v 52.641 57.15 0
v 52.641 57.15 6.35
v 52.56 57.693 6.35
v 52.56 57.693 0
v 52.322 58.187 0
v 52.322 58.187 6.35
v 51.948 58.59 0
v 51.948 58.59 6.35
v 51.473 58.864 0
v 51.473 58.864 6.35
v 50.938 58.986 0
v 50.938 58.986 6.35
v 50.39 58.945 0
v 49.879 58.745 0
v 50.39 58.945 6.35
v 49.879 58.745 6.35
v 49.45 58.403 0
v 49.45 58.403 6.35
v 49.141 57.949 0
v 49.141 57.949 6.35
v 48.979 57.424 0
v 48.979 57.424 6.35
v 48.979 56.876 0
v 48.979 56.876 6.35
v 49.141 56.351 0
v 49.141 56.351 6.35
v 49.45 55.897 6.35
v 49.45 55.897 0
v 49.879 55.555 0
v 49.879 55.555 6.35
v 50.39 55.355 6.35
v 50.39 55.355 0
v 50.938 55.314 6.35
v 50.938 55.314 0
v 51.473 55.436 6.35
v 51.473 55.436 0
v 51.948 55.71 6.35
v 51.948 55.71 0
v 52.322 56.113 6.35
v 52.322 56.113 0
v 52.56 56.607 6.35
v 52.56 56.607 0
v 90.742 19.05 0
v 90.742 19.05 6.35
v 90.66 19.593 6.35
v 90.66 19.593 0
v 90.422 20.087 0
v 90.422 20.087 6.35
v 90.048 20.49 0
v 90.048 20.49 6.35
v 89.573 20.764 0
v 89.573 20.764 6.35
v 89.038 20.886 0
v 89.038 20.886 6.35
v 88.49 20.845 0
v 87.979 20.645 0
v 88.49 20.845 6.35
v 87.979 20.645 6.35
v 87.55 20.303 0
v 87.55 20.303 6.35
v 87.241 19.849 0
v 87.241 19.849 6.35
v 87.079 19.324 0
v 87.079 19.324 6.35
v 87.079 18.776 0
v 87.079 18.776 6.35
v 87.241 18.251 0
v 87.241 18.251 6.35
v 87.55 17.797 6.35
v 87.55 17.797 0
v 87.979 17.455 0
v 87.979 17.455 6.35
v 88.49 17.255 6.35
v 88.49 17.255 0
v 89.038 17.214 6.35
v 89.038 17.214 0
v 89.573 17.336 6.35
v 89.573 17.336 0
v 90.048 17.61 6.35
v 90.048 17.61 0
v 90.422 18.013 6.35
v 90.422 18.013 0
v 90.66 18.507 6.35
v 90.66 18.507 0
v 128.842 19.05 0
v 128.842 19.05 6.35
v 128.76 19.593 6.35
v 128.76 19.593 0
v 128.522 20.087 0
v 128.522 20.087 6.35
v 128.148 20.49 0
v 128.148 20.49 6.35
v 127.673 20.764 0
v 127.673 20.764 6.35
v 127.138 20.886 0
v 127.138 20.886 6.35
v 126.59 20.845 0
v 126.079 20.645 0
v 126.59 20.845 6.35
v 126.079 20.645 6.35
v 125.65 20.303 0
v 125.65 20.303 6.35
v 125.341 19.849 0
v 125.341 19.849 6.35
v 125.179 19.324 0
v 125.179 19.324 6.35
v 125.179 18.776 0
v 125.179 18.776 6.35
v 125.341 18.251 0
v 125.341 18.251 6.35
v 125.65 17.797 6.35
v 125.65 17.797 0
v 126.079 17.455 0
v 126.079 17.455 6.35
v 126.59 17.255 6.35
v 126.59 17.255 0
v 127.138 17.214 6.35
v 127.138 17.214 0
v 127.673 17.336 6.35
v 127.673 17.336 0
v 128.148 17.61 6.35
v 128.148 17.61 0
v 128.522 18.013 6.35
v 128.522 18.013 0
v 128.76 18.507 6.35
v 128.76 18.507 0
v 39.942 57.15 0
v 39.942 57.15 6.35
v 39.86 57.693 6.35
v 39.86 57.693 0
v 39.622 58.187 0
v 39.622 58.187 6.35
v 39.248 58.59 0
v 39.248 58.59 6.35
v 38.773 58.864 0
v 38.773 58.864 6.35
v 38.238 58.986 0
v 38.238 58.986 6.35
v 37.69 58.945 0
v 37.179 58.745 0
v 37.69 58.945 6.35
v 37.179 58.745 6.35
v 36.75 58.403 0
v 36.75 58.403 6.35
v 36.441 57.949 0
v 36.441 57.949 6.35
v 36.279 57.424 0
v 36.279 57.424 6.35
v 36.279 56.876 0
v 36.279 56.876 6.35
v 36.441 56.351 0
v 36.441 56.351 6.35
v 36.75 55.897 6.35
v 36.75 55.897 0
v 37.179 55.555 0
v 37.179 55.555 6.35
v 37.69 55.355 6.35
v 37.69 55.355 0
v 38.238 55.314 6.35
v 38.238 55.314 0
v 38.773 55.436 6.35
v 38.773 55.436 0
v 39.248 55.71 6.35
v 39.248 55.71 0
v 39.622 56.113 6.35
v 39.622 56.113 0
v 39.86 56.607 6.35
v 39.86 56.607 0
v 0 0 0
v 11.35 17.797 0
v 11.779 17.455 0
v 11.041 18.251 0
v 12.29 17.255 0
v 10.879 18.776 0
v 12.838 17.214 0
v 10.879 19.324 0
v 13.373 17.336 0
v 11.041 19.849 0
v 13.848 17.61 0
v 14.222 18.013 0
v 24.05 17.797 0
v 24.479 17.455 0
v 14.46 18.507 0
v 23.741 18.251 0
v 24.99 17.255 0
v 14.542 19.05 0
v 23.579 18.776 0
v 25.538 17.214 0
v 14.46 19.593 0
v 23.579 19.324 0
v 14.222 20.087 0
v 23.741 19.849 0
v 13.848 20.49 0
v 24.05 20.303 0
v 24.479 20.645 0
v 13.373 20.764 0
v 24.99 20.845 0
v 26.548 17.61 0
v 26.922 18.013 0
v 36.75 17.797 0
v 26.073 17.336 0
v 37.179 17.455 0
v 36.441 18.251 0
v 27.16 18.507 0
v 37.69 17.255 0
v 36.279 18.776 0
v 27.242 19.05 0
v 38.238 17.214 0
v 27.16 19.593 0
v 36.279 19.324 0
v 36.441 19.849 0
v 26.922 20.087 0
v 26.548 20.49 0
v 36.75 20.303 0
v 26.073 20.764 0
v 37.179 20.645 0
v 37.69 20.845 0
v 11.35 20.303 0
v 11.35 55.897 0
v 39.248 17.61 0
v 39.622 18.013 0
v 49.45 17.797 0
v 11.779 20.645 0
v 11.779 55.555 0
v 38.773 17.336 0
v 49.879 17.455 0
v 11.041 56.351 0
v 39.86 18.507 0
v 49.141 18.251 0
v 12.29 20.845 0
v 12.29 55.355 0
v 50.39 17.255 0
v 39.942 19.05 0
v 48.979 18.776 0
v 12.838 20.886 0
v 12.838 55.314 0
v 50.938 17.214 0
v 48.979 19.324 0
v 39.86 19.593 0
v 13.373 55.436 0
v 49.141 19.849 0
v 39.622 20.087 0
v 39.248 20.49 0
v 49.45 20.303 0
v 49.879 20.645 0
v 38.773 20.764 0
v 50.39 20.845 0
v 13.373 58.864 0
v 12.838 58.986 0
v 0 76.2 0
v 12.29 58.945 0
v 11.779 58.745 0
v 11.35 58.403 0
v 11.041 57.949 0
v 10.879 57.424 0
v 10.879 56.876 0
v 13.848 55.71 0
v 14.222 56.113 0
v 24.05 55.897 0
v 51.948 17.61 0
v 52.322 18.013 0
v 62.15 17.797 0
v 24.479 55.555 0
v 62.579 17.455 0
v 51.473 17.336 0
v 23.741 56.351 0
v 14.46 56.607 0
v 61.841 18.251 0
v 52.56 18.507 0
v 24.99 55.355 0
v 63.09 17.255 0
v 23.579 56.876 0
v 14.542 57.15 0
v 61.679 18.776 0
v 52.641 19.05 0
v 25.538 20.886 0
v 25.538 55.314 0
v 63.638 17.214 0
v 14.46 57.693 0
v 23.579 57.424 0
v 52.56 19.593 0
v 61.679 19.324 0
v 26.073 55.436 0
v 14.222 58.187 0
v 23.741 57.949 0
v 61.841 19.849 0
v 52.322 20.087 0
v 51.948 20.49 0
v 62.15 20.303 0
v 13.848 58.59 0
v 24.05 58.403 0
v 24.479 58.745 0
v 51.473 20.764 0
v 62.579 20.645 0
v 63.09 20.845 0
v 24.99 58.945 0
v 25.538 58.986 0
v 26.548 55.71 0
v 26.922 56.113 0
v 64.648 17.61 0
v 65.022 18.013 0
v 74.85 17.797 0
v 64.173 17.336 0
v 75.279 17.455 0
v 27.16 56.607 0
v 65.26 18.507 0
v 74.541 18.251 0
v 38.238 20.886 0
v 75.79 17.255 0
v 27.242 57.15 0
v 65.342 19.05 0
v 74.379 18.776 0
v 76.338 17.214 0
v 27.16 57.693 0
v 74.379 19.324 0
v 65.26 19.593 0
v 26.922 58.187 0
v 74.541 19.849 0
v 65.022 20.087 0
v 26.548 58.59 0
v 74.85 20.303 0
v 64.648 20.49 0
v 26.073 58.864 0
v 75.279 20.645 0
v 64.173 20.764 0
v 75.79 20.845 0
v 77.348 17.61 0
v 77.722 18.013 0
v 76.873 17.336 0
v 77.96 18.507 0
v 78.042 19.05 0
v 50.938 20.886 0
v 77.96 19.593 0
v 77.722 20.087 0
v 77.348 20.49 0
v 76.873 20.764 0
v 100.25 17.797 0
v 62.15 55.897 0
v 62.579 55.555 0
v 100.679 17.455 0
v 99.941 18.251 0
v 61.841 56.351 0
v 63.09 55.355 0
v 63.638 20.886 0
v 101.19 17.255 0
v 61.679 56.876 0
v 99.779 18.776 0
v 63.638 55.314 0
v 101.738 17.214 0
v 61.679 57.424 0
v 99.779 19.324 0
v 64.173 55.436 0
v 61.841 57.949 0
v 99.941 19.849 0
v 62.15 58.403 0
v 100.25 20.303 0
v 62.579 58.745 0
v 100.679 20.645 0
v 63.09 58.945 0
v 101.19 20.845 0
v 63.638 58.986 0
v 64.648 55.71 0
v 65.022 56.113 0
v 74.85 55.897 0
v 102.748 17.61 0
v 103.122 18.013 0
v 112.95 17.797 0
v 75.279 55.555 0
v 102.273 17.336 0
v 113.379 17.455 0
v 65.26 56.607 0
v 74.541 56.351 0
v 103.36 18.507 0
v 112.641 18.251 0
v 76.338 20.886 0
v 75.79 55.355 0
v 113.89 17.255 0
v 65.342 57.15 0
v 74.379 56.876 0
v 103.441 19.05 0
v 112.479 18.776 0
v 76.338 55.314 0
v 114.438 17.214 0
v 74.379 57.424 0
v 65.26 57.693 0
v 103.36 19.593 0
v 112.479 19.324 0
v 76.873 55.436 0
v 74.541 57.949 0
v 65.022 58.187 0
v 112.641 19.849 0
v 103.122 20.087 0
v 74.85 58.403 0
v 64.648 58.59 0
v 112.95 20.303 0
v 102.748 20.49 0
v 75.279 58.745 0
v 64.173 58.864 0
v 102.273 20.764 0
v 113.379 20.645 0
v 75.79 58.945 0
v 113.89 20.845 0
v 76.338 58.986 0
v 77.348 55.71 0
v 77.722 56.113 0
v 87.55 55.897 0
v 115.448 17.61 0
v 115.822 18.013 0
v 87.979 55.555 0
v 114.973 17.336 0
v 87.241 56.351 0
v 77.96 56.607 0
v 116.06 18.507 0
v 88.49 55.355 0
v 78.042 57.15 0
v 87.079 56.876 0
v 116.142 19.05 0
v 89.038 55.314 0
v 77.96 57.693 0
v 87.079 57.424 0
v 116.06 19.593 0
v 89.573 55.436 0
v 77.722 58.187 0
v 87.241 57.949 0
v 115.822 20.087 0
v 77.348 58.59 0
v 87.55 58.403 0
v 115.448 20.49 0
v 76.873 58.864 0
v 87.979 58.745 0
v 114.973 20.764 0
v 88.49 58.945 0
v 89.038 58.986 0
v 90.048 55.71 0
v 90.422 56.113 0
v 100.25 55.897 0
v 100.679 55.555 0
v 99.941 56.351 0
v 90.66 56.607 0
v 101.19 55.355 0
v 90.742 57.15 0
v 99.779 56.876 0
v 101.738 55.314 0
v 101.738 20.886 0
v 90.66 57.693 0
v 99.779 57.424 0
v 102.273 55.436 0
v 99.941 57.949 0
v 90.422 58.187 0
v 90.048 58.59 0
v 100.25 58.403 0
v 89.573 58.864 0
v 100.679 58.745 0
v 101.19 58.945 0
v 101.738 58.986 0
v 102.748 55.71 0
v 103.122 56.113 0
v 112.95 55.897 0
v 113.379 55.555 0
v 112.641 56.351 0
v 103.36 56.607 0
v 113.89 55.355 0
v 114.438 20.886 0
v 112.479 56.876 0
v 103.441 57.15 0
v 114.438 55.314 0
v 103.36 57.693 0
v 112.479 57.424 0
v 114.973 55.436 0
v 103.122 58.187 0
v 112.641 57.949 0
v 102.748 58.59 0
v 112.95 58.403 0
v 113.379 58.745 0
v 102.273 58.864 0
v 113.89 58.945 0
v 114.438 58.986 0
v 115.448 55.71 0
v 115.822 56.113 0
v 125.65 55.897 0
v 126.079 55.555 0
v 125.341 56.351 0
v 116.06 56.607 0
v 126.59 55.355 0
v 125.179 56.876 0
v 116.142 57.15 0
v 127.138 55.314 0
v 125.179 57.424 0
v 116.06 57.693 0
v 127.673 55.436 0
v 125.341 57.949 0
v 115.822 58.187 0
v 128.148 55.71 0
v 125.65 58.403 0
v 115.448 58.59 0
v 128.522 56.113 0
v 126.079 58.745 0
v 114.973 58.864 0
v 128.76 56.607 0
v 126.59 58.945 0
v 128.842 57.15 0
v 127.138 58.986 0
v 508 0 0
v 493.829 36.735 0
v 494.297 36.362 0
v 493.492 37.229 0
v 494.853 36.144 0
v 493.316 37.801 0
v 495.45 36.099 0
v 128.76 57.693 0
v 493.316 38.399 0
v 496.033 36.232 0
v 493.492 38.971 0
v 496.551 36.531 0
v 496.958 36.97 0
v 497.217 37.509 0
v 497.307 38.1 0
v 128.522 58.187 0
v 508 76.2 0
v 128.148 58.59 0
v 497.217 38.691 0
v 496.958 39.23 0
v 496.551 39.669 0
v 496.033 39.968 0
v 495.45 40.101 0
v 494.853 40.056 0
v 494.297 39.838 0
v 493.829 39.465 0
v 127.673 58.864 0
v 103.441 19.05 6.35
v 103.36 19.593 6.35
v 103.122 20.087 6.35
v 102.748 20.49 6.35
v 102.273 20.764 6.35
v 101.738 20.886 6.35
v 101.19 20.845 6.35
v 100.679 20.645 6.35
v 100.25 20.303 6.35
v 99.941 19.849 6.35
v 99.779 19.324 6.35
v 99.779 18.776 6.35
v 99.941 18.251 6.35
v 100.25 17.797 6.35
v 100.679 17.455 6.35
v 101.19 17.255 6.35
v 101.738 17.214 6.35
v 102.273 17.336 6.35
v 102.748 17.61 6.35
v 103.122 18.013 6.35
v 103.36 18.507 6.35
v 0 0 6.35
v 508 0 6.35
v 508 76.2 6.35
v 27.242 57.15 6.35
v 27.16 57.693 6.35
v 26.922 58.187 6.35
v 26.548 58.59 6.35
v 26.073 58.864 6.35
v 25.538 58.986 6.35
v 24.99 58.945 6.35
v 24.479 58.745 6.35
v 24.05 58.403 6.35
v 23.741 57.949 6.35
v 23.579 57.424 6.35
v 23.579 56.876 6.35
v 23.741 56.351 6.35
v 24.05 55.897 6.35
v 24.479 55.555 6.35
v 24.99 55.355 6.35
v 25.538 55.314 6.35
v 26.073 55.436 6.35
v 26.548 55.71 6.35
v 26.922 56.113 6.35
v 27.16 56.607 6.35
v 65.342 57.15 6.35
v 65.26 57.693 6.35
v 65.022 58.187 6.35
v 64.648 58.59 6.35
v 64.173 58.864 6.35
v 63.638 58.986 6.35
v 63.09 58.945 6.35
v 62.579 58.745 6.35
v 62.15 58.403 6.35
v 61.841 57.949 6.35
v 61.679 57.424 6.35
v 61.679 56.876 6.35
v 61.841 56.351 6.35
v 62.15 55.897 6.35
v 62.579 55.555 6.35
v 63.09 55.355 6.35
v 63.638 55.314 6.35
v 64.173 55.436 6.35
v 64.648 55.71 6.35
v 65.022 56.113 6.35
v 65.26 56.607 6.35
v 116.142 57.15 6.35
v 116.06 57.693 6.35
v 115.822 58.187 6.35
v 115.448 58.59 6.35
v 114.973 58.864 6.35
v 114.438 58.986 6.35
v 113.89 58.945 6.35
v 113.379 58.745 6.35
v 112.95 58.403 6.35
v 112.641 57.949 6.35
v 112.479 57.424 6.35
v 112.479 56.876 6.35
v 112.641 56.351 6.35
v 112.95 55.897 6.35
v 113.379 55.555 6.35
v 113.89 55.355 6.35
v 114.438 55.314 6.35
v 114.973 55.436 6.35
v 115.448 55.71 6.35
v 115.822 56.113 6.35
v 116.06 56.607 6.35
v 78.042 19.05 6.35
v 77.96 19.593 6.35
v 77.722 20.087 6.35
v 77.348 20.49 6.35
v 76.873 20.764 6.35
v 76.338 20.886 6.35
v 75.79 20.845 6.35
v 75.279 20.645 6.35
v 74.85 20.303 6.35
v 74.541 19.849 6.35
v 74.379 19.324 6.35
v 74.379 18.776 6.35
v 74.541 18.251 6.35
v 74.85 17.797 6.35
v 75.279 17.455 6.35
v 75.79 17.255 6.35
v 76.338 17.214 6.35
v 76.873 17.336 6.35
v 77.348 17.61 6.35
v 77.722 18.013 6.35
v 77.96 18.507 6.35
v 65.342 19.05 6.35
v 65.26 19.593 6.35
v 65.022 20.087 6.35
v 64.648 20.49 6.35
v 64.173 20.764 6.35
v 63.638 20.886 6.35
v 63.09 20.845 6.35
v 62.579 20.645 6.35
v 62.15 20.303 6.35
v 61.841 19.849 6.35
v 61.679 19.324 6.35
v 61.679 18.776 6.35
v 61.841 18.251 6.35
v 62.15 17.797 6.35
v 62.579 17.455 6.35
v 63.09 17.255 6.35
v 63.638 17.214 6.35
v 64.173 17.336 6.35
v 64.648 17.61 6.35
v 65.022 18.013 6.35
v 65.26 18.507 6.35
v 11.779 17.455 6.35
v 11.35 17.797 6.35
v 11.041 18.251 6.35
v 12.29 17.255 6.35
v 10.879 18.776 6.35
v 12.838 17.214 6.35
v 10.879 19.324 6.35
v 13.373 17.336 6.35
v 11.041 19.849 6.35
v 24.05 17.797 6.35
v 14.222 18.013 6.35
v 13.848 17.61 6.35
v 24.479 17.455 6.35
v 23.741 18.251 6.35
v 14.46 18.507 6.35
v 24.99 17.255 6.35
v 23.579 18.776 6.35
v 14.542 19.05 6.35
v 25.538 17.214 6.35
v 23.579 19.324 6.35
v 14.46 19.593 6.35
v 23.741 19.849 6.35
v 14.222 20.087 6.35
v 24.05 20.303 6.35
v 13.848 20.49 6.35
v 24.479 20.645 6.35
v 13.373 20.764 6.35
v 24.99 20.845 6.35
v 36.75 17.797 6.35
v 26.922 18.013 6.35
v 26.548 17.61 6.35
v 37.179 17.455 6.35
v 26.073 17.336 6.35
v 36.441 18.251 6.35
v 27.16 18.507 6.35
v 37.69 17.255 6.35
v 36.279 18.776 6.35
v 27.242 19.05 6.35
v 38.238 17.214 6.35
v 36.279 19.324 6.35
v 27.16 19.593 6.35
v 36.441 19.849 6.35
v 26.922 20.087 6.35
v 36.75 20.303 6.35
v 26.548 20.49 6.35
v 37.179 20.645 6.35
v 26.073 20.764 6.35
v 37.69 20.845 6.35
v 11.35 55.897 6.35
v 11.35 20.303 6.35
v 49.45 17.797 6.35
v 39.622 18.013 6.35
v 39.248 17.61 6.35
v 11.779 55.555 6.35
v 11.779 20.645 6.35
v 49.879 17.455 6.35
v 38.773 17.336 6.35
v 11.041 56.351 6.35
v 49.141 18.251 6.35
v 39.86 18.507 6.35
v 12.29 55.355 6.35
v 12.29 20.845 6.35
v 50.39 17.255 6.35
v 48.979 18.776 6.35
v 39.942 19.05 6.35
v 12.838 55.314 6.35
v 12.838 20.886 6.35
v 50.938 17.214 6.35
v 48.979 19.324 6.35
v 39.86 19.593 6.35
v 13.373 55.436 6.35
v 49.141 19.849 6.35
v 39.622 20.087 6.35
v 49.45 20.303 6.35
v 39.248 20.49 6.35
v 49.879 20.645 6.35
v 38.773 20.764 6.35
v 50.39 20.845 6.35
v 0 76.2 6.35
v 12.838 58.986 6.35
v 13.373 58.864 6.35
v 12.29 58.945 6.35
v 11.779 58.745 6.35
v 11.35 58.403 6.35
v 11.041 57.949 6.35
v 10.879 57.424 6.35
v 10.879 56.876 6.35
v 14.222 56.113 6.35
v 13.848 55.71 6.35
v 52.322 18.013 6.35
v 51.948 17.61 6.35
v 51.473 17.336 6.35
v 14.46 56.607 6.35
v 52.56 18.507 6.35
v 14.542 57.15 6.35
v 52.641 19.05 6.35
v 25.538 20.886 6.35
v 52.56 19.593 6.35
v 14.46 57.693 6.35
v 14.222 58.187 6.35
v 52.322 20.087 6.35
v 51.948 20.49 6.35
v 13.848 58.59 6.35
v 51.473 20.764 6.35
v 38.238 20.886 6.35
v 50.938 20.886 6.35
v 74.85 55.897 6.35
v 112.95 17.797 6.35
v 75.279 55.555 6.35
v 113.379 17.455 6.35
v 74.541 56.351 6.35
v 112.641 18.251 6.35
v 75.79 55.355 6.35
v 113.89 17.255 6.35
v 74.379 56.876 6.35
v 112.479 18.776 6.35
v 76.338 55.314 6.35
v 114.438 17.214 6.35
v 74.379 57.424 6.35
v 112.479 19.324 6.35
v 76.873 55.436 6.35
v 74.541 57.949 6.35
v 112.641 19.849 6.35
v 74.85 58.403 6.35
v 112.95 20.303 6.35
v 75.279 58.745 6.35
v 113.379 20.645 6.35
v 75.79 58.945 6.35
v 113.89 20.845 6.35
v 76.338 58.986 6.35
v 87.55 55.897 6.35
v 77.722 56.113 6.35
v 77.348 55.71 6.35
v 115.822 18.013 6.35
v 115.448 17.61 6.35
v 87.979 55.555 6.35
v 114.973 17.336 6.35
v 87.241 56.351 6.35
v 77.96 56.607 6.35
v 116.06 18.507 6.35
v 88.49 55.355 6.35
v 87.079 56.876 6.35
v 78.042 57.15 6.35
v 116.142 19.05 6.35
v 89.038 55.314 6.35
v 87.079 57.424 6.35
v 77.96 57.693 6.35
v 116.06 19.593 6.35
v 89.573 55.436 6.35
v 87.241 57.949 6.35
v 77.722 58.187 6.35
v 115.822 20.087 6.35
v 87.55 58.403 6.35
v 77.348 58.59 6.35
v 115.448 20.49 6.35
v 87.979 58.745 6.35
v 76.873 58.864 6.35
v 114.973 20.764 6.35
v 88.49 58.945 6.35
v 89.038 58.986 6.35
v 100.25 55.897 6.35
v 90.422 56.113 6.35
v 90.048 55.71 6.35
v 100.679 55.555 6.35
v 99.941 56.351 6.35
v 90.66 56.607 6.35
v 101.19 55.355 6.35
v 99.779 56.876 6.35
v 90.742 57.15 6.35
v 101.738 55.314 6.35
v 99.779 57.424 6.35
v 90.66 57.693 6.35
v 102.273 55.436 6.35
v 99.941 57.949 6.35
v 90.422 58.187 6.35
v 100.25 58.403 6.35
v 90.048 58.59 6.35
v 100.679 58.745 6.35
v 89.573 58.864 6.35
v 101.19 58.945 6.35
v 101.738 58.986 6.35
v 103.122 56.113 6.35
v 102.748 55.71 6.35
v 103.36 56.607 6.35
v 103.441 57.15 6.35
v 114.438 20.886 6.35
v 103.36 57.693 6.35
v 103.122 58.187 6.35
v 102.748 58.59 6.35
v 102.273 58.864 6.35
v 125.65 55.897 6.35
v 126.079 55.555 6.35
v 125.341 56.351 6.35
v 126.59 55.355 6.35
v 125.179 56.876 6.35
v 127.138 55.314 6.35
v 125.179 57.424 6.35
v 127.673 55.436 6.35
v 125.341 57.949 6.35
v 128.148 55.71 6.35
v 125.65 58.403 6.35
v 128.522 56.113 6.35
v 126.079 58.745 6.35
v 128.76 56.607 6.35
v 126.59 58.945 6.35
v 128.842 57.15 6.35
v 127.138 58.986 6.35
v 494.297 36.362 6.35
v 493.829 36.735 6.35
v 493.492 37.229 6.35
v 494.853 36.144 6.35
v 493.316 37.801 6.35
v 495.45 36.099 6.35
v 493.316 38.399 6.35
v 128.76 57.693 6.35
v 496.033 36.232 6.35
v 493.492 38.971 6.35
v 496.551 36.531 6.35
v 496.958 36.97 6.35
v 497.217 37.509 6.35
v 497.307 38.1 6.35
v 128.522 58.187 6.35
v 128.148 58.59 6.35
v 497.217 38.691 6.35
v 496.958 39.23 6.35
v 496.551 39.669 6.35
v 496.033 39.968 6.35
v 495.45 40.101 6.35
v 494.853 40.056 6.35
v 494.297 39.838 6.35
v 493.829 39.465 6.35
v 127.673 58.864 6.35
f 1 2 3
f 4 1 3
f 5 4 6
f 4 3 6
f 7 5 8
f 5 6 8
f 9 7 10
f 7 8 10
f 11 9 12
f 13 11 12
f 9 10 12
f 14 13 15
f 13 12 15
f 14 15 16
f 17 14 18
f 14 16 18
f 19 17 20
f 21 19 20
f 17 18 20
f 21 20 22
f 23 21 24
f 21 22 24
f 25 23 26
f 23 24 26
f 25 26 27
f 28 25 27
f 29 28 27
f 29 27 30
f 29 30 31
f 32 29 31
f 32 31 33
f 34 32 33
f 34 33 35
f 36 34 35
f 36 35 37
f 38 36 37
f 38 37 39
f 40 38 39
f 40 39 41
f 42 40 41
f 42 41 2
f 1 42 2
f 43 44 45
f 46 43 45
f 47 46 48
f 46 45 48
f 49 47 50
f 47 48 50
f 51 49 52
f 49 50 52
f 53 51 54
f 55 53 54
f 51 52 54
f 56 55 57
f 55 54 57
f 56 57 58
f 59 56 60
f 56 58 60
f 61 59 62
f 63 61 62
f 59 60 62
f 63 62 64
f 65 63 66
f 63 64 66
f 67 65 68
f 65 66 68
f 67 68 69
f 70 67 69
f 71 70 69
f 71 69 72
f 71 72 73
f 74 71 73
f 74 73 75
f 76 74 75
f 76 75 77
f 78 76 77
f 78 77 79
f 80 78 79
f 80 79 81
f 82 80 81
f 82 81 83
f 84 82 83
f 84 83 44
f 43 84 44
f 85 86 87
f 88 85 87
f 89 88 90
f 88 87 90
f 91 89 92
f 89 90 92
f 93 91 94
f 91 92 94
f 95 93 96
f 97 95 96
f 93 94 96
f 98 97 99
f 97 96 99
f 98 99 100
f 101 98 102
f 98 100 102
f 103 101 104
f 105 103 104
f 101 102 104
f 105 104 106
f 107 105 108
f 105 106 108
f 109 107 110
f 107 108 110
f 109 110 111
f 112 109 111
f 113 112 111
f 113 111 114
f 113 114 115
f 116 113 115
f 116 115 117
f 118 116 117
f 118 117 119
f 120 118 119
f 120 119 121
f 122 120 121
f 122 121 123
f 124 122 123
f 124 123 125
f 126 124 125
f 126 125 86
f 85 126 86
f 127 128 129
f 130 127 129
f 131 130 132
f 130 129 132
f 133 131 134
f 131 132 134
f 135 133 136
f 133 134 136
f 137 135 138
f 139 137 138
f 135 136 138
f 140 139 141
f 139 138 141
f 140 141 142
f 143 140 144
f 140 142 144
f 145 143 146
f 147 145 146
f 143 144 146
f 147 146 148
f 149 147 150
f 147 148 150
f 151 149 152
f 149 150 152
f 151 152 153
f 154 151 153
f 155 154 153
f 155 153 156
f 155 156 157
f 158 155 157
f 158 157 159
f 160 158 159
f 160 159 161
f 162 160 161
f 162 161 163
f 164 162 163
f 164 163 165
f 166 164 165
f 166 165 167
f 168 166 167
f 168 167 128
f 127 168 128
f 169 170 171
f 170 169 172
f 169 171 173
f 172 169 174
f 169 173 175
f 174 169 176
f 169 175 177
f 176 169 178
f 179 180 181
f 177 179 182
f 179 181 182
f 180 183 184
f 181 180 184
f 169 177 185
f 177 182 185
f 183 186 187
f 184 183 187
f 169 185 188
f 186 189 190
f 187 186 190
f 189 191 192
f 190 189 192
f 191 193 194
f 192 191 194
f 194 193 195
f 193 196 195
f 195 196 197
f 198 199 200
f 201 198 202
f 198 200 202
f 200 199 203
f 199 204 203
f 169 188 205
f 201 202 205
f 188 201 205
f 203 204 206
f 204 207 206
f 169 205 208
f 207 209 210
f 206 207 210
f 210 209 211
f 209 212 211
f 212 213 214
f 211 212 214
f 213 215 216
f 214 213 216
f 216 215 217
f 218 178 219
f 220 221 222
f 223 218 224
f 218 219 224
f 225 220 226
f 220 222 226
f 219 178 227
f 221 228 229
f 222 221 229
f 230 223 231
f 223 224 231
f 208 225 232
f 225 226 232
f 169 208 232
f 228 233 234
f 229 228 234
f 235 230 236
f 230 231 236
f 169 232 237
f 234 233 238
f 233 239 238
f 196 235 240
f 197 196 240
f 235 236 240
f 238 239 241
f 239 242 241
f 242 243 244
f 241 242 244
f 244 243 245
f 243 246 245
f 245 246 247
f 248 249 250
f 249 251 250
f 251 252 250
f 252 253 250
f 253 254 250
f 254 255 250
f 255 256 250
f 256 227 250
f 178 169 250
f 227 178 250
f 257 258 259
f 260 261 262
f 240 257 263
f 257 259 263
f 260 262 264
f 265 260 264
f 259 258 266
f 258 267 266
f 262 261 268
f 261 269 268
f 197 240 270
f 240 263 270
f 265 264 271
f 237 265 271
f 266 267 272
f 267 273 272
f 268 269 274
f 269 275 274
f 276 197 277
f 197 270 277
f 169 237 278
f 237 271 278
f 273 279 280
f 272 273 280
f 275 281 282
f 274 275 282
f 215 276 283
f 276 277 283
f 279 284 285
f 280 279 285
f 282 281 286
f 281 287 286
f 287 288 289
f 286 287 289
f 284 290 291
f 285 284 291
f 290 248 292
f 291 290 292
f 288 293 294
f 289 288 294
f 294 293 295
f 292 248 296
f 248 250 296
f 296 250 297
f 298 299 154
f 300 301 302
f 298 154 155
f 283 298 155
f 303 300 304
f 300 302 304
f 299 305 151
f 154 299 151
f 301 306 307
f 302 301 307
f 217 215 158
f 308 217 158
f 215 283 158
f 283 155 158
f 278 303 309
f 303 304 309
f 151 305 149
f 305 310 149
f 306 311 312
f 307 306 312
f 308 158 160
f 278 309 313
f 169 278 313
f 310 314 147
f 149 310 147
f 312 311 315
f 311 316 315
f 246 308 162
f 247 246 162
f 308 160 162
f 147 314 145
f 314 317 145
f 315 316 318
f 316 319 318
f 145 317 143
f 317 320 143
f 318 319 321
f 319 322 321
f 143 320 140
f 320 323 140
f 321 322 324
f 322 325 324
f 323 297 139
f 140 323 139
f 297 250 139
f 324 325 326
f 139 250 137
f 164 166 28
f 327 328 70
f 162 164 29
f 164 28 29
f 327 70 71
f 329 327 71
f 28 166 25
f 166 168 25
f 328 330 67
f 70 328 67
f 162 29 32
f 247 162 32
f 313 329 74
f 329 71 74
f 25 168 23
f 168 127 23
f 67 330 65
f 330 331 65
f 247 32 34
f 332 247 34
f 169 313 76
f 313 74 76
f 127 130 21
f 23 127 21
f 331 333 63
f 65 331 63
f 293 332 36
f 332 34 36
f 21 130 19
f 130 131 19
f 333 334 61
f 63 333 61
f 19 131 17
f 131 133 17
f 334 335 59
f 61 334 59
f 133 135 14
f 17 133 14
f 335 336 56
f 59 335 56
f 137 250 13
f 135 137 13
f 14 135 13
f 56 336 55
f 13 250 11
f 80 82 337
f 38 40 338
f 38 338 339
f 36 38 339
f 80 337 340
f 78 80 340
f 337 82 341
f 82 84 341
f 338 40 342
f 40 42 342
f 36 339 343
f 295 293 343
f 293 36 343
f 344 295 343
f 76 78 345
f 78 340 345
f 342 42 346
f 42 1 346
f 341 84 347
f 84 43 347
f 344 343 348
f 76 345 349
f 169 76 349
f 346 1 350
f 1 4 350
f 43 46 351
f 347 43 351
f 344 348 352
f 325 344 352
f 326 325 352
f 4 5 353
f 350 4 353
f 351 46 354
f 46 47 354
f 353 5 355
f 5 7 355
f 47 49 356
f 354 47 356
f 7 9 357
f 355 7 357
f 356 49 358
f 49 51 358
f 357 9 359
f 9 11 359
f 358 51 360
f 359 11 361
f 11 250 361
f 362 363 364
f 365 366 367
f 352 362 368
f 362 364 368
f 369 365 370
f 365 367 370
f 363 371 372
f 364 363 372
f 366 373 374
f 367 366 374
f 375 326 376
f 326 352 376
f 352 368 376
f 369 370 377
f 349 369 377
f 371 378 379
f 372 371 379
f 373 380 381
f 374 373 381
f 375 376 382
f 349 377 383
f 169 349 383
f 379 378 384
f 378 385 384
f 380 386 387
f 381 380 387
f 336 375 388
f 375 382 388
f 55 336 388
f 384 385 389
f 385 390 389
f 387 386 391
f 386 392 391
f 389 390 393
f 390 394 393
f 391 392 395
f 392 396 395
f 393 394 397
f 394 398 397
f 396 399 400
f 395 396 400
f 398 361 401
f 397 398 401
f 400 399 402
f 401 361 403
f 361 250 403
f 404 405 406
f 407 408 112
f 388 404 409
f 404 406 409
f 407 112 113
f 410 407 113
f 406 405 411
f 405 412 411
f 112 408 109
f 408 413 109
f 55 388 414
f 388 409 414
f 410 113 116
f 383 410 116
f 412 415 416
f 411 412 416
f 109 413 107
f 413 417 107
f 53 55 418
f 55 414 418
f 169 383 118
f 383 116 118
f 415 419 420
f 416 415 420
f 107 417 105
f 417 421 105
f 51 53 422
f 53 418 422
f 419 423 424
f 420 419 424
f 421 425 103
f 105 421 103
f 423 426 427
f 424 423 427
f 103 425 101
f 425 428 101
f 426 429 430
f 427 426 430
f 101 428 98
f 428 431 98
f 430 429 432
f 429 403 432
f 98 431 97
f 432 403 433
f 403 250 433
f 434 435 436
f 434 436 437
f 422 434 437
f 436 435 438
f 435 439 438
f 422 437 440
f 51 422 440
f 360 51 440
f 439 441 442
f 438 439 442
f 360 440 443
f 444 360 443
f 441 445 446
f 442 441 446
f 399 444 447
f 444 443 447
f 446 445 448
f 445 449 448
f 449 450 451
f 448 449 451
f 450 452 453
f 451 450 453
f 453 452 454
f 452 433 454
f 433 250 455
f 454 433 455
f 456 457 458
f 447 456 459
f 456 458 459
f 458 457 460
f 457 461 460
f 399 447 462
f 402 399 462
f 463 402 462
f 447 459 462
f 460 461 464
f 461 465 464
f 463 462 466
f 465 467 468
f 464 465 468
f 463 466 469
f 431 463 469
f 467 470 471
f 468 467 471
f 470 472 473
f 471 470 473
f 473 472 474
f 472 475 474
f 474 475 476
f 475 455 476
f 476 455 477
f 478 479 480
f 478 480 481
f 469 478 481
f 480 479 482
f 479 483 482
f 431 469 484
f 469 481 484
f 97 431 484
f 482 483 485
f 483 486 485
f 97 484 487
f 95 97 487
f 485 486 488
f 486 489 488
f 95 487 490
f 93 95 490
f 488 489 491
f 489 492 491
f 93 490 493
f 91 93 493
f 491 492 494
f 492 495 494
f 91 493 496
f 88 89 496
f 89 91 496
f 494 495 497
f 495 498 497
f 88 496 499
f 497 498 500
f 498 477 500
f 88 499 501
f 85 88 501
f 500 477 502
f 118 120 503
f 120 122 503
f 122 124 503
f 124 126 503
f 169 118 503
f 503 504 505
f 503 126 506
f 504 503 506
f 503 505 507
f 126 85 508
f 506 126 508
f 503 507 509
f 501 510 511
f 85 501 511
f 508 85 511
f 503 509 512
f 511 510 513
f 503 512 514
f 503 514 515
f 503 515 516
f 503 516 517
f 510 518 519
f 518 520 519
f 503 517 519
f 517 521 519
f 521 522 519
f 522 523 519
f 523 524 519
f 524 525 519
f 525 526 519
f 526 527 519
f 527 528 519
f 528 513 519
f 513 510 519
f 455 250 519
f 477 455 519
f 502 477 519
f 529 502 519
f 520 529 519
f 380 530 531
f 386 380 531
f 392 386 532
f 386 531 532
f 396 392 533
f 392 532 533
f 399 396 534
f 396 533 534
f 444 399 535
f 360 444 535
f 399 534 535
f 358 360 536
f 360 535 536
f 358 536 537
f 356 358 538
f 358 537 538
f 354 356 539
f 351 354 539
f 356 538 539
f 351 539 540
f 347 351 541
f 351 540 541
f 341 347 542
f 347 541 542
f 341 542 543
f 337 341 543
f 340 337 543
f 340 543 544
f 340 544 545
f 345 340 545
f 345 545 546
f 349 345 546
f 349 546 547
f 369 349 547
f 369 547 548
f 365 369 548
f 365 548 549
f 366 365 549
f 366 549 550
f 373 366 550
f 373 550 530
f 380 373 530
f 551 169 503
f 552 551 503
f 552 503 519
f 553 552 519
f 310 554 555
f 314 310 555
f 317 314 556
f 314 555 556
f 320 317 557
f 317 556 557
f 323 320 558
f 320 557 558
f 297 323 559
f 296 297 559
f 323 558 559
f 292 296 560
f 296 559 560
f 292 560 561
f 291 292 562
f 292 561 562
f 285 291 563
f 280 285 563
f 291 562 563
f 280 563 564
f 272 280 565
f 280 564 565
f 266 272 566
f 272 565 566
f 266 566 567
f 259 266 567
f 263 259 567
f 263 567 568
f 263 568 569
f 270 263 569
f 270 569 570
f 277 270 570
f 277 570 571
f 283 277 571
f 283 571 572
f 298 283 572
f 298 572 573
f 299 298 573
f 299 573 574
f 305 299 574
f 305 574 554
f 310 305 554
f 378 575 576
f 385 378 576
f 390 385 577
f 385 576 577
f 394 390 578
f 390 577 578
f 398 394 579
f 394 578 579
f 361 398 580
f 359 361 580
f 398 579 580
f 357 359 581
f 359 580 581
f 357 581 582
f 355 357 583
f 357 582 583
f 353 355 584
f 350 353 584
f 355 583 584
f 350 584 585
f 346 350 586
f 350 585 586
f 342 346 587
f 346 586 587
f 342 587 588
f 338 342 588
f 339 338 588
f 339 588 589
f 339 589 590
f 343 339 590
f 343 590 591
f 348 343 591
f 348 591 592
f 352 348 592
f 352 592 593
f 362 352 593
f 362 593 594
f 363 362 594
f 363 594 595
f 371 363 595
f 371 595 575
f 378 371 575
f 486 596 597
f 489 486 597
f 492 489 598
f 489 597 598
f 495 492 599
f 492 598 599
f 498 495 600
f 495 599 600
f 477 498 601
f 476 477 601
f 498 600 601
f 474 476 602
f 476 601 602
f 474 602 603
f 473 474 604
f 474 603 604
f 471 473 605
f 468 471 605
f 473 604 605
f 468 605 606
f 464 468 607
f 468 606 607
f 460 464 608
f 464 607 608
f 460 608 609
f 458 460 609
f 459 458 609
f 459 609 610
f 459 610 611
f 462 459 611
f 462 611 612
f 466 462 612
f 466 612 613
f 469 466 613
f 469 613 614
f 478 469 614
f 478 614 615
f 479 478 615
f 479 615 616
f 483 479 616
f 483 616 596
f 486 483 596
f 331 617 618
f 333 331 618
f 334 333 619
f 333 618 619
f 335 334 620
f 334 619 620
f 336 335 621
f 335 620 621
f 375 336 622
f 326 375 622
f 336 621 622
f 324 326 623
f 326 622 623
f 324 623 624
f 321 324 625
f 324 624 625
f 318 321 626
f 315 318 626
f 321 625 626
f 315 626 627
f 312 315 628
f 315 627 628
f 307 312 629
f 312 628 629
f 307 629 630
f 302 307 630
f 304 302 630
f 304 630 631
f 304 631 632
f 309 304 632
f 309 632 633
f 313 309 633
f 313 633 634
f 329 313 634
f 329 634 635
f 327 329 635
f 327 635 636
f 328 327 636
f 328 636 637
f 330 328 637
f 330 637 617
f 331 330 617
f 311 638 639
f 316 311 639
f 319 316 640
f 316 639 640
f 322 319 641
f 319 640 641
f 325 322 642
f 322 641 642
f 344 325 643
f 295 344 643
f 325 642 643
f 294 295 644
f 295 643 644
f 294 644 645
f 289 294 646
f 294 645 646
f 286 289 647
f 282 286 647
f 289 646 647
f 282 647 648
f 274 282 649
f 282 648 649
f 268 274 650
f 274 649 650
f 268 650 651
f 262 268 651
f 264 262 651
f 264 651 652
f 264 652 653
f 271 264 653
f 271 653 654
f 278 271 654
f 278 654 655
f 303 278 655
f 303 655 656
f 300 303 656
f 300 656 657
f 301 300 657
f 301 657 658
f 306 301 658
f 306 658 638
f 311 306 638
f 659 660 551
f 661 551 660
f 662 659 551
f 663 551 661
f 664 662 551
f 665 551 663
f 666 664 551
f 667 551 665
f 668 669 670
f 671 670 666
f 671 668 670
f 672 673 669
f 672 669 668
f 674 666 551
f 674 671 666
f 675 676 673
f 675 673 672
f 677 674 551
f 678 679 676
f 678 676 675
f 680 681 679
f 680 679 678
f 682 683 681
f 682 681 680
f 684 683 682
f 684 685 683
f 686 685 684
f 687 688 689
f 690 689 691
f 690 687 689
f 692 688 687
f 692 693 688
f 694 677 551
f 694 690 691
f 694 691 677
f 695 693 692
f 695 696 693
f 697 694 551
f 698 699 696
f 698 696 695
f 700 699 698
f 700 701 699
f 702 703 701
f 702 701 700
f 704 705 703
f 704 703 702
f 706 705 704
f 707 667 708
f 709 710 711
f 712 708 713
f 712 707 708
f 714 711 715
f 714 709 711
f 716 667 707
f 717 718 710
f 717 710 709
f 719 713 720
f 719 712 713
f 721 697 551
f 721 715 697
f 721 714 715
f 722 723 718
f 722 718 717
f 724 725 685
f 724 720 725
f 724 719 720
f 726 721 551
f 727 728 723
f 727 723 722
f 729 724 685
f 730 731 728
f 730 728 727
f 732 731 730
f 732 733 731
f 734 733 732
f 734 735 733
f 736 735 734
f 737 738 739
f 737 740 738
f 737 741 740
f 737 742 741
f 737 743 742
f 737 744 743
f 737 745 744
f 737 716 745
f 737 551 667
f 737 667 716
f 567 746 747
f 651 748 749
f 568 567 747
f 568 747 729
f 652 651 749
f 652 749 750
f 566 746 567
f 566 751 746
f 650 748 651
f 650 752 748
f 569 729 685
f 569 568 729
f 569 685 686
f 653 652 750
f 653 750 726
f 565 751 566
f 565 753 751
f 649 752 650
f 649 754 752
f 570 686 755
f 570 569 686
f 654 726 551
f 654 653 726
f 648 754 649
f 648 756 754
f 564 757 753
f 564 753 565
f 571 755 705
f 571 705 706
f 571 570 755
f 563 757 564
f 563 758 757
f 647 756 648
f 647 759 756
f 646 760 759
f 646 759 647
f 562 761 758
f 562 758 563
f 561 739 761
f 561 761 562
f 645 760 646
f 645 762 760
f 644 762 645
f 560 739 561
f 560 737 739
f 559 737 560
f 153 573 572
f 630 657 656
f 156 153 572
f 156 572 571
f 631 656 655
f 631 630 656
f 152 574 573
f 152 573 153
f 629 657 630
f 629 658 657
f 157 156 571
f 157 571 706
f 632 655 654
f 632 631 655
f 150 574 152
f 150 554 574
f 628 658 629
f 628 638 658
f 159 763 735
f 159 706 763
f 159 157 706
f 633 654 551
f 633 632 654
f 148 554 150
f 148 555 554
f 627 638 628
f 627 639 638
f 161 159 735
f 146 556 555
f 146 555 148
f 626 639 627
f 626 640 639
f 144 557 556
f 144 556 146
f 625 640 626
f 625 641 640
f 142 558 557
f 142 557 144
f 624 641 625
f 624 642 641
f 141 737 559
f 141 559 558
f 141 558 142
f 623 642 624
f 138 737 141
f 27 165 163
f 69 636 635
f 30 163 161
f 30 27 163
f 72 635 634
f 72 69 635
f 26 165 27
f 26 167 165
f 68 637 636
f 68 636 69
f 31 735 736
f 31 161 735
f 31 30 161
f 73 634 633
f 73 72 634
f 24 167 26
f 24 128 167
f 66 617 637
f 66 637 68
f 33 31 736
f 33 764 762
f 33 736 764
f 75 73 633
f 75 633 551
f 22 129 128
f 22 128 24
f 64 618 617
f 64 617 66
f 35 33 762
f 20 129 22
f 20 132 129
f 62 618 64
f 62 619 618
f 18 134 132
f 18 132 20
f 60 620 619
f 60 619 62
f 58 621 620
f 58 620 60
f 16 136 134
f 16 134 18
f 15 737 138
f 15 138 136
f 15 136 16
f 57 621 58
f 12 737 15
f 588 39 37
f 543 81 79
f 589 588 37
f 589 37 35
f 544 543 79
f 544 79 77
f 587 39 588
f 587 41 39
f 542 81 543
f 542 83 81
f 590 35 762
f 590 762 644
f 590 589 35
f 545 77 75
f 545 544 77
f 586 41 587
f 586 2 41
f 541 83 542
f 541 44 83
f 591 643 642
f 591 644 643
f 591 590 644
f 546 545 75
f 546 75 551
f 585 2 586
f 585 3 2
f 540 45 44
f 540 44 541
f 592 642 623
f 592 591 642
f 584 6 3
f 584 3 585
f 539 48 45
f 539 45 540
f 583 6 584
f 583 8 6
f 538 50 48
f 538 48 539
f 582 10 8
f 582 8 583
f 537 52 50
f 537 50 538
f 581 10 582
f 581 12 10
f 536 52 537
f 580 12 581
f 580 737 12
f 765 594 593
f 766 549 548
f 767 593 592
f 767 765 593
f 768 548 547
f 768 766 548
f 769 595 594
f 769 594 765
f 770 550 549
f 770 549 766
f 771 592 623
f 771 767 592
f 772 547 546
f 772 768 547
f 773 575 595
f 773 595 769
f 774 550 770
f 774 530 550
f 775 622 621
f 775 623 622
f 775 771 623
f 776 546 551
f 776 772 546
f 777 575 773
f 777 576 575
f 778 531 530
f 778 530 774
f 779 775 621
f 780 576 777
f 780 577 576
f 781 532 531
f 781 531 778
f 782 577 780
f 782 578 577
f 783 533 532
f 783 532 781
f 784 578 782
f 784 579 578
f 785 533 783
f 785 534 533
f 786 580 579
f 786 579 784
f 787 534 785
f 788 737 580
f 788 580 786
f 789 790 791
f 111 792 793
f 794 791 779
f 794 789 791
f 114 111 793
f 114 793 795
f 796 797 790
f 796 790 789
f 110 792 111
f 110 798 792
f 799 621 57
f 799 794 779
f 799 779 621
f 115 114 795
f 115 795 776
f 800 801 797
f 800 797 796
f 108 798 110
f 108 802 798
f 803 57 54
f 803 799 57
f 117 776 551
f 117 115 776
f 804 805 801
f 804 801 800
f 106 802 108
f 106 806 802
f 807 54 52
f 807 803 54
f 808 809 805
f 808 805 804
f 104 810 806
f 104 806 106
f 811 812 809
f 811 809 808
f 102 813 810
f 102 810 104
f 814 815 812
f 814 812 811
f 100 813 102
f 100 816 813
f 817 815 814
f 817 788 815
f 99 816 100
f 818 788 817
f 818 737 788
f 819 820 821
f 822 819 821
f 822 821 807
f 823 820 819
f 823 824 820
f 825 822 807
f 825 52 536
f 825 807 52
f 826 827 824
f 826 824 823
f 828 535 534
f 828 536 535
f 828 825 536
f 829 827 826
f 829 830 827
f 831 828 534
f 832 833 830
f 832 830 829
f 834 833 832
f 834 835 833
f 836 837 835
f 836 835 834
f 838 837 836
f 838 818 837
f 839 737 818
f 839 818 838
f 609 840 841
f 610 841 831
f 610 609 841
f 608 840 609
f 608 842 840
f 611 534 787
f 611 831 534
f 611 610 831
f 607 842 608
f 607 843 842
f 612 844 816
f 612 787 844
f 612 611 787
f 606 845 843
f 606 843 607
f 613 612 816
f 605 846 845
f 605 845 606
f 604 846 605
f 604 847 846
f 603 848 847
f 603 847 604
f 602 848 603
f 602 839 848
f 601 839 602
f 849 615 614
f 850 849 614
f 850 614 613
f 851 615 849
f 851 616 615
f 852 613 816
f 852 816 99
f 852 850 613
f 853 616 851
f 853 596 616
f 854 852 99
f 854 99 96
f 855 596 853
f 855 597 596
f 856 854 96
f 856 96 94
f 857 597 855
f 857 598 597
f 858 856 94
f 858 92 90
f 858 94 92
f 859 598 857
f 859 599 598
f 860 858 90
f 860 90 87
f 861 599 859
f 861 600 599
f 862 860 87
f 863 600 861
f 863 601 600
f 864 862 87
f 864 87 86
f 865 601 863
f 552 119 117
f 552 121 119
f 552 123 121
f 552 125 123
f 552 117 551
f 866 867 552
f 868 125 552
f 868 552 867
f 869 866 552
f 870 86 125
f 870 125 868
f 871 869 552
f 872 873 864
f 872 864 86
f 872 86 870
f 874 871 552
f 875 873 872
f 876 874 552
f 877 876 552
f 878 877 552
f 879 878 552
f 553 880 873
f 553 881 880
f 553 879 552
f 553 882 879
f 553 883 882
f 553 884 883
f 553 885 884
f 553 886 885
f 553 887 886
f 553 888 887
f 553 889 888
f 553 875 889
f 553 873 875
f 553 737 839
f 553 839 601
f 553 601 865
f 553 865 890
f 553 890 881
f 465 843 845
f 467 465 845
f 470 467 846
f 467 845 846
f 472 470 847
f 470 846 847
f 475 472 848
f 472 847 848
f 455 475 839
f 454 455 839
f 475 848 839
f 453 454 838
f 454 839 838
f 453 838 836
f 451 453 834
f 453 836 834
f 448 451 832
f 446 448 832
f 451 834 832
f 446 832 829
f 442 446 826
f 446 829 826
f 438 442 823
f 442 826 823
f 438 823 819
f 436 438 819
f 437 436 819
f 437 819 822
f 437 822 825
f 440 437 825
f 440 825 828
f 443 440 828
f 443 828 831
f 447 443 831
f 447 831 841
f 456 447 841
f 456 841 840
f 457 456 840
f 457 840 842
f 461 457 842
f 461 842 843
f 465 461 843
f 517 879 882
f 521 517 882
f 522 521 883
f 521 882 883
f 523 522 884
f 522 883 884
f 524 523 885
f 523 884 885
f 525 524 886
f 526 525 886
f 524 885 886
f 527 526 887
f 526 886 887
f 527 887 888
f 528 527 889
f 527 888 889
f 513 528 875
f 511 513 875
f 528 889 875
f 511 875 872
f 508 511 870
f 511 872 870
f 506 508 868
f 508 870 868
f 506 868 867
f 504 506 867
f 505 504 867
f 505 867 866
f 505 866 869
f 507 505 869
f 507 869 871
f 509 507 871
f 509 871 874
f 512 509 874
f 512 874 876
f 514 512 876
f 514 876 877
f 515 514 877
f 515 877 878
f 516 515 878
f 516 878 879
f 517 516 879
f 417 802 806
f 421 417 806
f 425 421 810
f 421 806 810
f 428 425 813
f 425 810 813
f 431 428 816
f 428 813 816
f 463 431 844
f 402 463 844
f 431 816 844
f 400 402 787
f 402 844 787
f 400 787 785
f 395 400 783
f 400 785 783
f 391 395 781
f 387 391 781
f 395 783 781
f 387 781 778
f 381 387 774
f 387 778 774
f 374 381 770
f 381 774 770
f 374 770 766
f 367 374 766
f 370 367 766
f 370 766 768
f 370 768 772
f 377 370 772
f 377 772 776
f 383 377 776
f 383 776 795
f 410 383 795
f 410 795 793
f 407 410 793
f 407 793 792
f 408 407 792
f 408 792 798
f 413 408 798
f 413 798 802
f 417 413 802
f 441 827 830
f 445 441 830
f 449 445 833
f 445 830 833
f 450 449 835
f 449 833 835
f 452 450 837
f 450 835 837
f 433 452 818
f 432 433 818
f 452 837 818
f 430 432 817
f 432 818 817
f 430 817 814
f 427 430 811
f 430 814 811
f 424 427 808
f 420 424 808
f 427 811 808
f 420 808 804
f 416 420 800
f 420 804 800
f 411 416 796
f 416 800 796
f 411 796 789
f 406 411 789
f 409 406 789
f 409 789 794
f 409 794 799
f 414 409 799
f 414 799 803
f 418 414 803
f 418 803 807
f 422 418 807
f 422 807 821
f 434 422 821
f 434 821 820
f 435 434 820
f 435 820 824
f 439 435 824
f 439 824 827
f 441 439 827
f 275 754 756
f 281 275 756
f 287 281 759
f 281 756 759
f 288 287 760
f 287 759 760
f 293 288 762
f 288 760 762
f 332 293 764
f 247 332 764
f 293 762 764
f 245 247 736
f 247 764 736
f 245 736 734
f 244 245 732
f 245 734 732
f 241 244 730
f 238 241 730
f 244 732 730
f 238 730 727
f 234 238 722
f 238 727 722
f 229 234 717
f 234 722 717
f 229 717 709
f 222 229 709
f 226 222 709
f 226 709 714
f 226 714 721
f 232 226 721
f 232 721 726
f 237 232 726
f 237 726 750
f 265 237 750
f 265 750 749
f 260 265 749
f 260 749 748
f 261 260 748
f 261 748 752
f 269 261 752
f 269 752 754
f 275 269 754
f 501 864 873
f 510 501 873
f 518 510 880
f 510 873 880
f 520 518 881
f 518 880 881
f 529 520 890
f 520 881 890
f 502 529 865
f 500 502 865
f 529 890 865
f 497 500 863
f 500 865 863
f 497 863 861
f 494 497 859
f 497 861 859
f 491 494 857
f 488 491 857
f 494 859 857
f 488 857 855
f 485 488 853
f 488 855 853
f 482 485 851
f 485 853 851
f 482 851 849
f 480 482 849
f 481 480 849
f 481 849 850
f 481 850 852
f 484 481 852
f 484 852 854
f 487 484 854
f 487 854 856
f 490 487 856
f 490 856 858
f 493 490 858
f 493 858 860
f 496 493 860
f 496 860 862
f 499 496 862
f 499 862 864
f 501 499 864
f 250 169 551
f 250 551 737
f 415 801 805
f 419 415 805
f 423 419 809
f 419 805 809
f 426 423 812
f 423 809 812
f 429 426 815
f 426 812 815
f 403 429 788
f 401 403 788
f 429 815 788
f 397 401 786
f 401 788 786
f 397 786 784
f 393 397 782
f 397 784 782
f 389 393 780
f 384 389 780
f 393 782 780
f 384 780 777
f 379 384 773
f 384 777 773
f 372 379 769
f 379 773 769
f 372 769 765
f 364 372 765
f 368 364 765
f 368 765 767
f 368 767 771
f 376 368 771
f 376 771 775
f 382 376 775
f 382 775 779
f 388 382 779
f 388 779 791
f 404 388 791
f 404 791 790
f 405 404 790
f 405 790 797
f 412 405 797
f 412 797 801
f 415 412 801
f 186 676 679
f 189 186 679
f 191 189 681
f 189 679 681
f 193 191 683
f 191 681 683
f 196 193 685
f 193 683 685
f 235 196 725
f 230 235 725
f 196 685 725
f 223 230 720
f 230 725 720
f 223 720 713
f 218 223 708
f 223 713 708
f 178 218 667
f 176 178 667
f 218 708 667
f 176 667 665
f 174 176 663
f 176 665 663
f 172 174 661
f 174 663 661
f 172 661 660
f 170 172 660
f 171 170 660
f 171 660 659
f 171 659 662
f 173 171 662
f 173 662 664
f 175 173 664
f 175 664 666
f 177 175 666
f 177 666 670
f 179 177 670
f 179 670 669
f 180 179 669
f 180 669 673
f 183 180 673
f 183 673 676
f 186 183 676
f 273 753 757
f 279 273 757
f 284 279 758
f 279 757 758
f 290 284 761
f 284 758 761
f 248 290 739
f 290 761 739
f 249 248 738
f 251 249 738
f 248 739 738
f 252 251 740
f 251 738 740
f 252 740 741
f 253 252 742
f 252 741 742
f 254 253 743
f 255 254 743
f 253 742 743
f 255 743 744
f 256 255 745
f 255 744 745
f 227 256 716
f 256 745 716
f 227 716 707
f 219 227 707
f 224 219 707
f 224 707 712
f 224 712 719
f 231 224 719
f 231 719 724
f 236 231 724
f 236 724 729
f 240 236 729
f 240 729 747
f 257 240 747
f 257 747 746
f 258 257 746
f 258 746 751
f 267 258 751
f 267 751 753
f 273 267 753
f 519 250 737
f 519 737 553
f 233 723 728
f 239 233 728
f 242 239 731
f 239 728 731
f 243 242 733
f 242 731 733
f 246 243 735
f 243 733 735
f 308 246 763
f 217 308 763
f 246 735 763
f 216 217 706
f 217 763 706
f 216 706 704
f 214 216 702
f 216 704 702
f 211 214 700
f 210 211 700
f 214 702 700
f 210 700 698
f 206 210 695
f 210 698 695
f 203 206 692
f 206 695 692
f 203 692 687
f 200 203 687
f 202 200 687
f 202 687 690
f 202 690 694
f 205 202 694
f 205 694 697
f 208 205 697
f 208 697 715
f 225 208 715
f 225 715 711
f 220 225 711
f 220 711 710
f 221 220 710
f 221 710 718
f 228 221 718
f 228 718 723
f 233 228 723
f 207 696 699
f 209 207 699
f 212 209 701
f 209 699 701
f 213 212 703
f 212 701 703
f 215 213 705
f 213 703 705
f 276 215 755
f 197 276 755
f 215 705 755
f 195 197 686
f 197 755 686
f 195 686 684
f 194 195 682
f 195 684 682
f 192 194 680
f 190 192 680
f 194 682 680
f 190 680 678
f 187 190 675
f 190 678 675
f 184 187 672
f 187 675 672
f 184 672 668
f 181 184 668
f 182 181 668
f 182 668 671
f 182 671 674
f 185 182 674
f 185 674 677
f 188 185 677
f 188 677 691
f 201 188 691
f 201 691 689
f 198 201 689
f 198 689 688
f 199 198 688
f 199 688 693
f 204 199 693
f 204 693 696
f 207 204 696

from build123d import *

# Parameters (mm, degrees)
SKETCH1_W             = 508
SKETCH1_H             = 76.2
BASIC_PLANK_DEPTH     = 6.35
SKETCH2_R             = 1.8415
PLACEMENT_HOLES_DEPTH = 7.35
SKETCH3_R             = 2.0066
WHEEL_HOLE_DEPTH      = 7.35


with BuildPart() as part:
    # Sketch1 → basic_plank (new body)
    with BuildSketch(Plane.XY):
        with Locations((254, 38.1)):
            Rectangle(SKETCH1_W, SKETCH1_H)
    extrude(amount=BASIC_PLANK_DEPTH)

    # Sketch2 → placement holes (cut, through all)
    with BuildSketch(Plane.XY.offset(6.35)):
        with Locations((12.7, 57.15)):
            Circle(SKETCH2_R)
        with Locations((25.4, 57.15)):
            Circle(SKETCH2_R)
        with Locations((38.1, 57.15)):
            Circle(SKETCH2_R)
        with Locations((50.8, 57.15)):
            Circle(SKETCH2_R)
        with Locations((63.5, 57.15)):
            Circle(SKETCH2_R)
        with Locations((76.2, 57.15)):
            Circle(SKETCH2_R)
        with Locations((88.9, 57.15)):
            Circle(SKETCH2_R)
        with Locations((101.6, 57.15)):
            Circle(SKETCH2_R)
        with Locations((114.3, 57.15)):
            Circle(SKETCH2_R)
        with Locations((127, 57.15)):
            Circle(SKETCH2_R)
        with Locations((12.7, 19.05)):
            Circle(SKETCH2_R)
        with Locations((25.4, 19.05)):
            Circle(SKETCH2_R)
        with Locations((38.1, 19.05)):
            Circle(SKETCH2_R)
        with Locations((50.8, 19.05)):
            Circle(SKETCH2_R)
        with Locations((63.5, 19.05)):
            Circle(SKETCH2_R)
        with Locations((76.2, 19.05)):
            Circle(SKETCH2_R)
        with Locations((88.9, 19.05)):
            Circle(SKETCH2_R)
        with Locations((101.6, 19.05)):
            Circle(SKETCH2_R)
        with Locations((114.3, 19.05)):
            Circle(SKETCH2_R)
        with Locations((127, 19.05)):
            Circle(SKETCH2_R)
    extrude(amount=-PLACEMENT_HOLES_DEPTH, mode=Mode.SUBTRACT)

    # Sketch3 → wheel_hole (cut, through all)
    with BuildSketch(Plane.XY.offset(6.35)):
        with Locations((495.3, 38.1)):
            Circle(SKETCH3_R)
    extrude(amount=-WHEEL_HOLE_DEPTH, mode=Mode.SUBTRACT)


solid = part.part
